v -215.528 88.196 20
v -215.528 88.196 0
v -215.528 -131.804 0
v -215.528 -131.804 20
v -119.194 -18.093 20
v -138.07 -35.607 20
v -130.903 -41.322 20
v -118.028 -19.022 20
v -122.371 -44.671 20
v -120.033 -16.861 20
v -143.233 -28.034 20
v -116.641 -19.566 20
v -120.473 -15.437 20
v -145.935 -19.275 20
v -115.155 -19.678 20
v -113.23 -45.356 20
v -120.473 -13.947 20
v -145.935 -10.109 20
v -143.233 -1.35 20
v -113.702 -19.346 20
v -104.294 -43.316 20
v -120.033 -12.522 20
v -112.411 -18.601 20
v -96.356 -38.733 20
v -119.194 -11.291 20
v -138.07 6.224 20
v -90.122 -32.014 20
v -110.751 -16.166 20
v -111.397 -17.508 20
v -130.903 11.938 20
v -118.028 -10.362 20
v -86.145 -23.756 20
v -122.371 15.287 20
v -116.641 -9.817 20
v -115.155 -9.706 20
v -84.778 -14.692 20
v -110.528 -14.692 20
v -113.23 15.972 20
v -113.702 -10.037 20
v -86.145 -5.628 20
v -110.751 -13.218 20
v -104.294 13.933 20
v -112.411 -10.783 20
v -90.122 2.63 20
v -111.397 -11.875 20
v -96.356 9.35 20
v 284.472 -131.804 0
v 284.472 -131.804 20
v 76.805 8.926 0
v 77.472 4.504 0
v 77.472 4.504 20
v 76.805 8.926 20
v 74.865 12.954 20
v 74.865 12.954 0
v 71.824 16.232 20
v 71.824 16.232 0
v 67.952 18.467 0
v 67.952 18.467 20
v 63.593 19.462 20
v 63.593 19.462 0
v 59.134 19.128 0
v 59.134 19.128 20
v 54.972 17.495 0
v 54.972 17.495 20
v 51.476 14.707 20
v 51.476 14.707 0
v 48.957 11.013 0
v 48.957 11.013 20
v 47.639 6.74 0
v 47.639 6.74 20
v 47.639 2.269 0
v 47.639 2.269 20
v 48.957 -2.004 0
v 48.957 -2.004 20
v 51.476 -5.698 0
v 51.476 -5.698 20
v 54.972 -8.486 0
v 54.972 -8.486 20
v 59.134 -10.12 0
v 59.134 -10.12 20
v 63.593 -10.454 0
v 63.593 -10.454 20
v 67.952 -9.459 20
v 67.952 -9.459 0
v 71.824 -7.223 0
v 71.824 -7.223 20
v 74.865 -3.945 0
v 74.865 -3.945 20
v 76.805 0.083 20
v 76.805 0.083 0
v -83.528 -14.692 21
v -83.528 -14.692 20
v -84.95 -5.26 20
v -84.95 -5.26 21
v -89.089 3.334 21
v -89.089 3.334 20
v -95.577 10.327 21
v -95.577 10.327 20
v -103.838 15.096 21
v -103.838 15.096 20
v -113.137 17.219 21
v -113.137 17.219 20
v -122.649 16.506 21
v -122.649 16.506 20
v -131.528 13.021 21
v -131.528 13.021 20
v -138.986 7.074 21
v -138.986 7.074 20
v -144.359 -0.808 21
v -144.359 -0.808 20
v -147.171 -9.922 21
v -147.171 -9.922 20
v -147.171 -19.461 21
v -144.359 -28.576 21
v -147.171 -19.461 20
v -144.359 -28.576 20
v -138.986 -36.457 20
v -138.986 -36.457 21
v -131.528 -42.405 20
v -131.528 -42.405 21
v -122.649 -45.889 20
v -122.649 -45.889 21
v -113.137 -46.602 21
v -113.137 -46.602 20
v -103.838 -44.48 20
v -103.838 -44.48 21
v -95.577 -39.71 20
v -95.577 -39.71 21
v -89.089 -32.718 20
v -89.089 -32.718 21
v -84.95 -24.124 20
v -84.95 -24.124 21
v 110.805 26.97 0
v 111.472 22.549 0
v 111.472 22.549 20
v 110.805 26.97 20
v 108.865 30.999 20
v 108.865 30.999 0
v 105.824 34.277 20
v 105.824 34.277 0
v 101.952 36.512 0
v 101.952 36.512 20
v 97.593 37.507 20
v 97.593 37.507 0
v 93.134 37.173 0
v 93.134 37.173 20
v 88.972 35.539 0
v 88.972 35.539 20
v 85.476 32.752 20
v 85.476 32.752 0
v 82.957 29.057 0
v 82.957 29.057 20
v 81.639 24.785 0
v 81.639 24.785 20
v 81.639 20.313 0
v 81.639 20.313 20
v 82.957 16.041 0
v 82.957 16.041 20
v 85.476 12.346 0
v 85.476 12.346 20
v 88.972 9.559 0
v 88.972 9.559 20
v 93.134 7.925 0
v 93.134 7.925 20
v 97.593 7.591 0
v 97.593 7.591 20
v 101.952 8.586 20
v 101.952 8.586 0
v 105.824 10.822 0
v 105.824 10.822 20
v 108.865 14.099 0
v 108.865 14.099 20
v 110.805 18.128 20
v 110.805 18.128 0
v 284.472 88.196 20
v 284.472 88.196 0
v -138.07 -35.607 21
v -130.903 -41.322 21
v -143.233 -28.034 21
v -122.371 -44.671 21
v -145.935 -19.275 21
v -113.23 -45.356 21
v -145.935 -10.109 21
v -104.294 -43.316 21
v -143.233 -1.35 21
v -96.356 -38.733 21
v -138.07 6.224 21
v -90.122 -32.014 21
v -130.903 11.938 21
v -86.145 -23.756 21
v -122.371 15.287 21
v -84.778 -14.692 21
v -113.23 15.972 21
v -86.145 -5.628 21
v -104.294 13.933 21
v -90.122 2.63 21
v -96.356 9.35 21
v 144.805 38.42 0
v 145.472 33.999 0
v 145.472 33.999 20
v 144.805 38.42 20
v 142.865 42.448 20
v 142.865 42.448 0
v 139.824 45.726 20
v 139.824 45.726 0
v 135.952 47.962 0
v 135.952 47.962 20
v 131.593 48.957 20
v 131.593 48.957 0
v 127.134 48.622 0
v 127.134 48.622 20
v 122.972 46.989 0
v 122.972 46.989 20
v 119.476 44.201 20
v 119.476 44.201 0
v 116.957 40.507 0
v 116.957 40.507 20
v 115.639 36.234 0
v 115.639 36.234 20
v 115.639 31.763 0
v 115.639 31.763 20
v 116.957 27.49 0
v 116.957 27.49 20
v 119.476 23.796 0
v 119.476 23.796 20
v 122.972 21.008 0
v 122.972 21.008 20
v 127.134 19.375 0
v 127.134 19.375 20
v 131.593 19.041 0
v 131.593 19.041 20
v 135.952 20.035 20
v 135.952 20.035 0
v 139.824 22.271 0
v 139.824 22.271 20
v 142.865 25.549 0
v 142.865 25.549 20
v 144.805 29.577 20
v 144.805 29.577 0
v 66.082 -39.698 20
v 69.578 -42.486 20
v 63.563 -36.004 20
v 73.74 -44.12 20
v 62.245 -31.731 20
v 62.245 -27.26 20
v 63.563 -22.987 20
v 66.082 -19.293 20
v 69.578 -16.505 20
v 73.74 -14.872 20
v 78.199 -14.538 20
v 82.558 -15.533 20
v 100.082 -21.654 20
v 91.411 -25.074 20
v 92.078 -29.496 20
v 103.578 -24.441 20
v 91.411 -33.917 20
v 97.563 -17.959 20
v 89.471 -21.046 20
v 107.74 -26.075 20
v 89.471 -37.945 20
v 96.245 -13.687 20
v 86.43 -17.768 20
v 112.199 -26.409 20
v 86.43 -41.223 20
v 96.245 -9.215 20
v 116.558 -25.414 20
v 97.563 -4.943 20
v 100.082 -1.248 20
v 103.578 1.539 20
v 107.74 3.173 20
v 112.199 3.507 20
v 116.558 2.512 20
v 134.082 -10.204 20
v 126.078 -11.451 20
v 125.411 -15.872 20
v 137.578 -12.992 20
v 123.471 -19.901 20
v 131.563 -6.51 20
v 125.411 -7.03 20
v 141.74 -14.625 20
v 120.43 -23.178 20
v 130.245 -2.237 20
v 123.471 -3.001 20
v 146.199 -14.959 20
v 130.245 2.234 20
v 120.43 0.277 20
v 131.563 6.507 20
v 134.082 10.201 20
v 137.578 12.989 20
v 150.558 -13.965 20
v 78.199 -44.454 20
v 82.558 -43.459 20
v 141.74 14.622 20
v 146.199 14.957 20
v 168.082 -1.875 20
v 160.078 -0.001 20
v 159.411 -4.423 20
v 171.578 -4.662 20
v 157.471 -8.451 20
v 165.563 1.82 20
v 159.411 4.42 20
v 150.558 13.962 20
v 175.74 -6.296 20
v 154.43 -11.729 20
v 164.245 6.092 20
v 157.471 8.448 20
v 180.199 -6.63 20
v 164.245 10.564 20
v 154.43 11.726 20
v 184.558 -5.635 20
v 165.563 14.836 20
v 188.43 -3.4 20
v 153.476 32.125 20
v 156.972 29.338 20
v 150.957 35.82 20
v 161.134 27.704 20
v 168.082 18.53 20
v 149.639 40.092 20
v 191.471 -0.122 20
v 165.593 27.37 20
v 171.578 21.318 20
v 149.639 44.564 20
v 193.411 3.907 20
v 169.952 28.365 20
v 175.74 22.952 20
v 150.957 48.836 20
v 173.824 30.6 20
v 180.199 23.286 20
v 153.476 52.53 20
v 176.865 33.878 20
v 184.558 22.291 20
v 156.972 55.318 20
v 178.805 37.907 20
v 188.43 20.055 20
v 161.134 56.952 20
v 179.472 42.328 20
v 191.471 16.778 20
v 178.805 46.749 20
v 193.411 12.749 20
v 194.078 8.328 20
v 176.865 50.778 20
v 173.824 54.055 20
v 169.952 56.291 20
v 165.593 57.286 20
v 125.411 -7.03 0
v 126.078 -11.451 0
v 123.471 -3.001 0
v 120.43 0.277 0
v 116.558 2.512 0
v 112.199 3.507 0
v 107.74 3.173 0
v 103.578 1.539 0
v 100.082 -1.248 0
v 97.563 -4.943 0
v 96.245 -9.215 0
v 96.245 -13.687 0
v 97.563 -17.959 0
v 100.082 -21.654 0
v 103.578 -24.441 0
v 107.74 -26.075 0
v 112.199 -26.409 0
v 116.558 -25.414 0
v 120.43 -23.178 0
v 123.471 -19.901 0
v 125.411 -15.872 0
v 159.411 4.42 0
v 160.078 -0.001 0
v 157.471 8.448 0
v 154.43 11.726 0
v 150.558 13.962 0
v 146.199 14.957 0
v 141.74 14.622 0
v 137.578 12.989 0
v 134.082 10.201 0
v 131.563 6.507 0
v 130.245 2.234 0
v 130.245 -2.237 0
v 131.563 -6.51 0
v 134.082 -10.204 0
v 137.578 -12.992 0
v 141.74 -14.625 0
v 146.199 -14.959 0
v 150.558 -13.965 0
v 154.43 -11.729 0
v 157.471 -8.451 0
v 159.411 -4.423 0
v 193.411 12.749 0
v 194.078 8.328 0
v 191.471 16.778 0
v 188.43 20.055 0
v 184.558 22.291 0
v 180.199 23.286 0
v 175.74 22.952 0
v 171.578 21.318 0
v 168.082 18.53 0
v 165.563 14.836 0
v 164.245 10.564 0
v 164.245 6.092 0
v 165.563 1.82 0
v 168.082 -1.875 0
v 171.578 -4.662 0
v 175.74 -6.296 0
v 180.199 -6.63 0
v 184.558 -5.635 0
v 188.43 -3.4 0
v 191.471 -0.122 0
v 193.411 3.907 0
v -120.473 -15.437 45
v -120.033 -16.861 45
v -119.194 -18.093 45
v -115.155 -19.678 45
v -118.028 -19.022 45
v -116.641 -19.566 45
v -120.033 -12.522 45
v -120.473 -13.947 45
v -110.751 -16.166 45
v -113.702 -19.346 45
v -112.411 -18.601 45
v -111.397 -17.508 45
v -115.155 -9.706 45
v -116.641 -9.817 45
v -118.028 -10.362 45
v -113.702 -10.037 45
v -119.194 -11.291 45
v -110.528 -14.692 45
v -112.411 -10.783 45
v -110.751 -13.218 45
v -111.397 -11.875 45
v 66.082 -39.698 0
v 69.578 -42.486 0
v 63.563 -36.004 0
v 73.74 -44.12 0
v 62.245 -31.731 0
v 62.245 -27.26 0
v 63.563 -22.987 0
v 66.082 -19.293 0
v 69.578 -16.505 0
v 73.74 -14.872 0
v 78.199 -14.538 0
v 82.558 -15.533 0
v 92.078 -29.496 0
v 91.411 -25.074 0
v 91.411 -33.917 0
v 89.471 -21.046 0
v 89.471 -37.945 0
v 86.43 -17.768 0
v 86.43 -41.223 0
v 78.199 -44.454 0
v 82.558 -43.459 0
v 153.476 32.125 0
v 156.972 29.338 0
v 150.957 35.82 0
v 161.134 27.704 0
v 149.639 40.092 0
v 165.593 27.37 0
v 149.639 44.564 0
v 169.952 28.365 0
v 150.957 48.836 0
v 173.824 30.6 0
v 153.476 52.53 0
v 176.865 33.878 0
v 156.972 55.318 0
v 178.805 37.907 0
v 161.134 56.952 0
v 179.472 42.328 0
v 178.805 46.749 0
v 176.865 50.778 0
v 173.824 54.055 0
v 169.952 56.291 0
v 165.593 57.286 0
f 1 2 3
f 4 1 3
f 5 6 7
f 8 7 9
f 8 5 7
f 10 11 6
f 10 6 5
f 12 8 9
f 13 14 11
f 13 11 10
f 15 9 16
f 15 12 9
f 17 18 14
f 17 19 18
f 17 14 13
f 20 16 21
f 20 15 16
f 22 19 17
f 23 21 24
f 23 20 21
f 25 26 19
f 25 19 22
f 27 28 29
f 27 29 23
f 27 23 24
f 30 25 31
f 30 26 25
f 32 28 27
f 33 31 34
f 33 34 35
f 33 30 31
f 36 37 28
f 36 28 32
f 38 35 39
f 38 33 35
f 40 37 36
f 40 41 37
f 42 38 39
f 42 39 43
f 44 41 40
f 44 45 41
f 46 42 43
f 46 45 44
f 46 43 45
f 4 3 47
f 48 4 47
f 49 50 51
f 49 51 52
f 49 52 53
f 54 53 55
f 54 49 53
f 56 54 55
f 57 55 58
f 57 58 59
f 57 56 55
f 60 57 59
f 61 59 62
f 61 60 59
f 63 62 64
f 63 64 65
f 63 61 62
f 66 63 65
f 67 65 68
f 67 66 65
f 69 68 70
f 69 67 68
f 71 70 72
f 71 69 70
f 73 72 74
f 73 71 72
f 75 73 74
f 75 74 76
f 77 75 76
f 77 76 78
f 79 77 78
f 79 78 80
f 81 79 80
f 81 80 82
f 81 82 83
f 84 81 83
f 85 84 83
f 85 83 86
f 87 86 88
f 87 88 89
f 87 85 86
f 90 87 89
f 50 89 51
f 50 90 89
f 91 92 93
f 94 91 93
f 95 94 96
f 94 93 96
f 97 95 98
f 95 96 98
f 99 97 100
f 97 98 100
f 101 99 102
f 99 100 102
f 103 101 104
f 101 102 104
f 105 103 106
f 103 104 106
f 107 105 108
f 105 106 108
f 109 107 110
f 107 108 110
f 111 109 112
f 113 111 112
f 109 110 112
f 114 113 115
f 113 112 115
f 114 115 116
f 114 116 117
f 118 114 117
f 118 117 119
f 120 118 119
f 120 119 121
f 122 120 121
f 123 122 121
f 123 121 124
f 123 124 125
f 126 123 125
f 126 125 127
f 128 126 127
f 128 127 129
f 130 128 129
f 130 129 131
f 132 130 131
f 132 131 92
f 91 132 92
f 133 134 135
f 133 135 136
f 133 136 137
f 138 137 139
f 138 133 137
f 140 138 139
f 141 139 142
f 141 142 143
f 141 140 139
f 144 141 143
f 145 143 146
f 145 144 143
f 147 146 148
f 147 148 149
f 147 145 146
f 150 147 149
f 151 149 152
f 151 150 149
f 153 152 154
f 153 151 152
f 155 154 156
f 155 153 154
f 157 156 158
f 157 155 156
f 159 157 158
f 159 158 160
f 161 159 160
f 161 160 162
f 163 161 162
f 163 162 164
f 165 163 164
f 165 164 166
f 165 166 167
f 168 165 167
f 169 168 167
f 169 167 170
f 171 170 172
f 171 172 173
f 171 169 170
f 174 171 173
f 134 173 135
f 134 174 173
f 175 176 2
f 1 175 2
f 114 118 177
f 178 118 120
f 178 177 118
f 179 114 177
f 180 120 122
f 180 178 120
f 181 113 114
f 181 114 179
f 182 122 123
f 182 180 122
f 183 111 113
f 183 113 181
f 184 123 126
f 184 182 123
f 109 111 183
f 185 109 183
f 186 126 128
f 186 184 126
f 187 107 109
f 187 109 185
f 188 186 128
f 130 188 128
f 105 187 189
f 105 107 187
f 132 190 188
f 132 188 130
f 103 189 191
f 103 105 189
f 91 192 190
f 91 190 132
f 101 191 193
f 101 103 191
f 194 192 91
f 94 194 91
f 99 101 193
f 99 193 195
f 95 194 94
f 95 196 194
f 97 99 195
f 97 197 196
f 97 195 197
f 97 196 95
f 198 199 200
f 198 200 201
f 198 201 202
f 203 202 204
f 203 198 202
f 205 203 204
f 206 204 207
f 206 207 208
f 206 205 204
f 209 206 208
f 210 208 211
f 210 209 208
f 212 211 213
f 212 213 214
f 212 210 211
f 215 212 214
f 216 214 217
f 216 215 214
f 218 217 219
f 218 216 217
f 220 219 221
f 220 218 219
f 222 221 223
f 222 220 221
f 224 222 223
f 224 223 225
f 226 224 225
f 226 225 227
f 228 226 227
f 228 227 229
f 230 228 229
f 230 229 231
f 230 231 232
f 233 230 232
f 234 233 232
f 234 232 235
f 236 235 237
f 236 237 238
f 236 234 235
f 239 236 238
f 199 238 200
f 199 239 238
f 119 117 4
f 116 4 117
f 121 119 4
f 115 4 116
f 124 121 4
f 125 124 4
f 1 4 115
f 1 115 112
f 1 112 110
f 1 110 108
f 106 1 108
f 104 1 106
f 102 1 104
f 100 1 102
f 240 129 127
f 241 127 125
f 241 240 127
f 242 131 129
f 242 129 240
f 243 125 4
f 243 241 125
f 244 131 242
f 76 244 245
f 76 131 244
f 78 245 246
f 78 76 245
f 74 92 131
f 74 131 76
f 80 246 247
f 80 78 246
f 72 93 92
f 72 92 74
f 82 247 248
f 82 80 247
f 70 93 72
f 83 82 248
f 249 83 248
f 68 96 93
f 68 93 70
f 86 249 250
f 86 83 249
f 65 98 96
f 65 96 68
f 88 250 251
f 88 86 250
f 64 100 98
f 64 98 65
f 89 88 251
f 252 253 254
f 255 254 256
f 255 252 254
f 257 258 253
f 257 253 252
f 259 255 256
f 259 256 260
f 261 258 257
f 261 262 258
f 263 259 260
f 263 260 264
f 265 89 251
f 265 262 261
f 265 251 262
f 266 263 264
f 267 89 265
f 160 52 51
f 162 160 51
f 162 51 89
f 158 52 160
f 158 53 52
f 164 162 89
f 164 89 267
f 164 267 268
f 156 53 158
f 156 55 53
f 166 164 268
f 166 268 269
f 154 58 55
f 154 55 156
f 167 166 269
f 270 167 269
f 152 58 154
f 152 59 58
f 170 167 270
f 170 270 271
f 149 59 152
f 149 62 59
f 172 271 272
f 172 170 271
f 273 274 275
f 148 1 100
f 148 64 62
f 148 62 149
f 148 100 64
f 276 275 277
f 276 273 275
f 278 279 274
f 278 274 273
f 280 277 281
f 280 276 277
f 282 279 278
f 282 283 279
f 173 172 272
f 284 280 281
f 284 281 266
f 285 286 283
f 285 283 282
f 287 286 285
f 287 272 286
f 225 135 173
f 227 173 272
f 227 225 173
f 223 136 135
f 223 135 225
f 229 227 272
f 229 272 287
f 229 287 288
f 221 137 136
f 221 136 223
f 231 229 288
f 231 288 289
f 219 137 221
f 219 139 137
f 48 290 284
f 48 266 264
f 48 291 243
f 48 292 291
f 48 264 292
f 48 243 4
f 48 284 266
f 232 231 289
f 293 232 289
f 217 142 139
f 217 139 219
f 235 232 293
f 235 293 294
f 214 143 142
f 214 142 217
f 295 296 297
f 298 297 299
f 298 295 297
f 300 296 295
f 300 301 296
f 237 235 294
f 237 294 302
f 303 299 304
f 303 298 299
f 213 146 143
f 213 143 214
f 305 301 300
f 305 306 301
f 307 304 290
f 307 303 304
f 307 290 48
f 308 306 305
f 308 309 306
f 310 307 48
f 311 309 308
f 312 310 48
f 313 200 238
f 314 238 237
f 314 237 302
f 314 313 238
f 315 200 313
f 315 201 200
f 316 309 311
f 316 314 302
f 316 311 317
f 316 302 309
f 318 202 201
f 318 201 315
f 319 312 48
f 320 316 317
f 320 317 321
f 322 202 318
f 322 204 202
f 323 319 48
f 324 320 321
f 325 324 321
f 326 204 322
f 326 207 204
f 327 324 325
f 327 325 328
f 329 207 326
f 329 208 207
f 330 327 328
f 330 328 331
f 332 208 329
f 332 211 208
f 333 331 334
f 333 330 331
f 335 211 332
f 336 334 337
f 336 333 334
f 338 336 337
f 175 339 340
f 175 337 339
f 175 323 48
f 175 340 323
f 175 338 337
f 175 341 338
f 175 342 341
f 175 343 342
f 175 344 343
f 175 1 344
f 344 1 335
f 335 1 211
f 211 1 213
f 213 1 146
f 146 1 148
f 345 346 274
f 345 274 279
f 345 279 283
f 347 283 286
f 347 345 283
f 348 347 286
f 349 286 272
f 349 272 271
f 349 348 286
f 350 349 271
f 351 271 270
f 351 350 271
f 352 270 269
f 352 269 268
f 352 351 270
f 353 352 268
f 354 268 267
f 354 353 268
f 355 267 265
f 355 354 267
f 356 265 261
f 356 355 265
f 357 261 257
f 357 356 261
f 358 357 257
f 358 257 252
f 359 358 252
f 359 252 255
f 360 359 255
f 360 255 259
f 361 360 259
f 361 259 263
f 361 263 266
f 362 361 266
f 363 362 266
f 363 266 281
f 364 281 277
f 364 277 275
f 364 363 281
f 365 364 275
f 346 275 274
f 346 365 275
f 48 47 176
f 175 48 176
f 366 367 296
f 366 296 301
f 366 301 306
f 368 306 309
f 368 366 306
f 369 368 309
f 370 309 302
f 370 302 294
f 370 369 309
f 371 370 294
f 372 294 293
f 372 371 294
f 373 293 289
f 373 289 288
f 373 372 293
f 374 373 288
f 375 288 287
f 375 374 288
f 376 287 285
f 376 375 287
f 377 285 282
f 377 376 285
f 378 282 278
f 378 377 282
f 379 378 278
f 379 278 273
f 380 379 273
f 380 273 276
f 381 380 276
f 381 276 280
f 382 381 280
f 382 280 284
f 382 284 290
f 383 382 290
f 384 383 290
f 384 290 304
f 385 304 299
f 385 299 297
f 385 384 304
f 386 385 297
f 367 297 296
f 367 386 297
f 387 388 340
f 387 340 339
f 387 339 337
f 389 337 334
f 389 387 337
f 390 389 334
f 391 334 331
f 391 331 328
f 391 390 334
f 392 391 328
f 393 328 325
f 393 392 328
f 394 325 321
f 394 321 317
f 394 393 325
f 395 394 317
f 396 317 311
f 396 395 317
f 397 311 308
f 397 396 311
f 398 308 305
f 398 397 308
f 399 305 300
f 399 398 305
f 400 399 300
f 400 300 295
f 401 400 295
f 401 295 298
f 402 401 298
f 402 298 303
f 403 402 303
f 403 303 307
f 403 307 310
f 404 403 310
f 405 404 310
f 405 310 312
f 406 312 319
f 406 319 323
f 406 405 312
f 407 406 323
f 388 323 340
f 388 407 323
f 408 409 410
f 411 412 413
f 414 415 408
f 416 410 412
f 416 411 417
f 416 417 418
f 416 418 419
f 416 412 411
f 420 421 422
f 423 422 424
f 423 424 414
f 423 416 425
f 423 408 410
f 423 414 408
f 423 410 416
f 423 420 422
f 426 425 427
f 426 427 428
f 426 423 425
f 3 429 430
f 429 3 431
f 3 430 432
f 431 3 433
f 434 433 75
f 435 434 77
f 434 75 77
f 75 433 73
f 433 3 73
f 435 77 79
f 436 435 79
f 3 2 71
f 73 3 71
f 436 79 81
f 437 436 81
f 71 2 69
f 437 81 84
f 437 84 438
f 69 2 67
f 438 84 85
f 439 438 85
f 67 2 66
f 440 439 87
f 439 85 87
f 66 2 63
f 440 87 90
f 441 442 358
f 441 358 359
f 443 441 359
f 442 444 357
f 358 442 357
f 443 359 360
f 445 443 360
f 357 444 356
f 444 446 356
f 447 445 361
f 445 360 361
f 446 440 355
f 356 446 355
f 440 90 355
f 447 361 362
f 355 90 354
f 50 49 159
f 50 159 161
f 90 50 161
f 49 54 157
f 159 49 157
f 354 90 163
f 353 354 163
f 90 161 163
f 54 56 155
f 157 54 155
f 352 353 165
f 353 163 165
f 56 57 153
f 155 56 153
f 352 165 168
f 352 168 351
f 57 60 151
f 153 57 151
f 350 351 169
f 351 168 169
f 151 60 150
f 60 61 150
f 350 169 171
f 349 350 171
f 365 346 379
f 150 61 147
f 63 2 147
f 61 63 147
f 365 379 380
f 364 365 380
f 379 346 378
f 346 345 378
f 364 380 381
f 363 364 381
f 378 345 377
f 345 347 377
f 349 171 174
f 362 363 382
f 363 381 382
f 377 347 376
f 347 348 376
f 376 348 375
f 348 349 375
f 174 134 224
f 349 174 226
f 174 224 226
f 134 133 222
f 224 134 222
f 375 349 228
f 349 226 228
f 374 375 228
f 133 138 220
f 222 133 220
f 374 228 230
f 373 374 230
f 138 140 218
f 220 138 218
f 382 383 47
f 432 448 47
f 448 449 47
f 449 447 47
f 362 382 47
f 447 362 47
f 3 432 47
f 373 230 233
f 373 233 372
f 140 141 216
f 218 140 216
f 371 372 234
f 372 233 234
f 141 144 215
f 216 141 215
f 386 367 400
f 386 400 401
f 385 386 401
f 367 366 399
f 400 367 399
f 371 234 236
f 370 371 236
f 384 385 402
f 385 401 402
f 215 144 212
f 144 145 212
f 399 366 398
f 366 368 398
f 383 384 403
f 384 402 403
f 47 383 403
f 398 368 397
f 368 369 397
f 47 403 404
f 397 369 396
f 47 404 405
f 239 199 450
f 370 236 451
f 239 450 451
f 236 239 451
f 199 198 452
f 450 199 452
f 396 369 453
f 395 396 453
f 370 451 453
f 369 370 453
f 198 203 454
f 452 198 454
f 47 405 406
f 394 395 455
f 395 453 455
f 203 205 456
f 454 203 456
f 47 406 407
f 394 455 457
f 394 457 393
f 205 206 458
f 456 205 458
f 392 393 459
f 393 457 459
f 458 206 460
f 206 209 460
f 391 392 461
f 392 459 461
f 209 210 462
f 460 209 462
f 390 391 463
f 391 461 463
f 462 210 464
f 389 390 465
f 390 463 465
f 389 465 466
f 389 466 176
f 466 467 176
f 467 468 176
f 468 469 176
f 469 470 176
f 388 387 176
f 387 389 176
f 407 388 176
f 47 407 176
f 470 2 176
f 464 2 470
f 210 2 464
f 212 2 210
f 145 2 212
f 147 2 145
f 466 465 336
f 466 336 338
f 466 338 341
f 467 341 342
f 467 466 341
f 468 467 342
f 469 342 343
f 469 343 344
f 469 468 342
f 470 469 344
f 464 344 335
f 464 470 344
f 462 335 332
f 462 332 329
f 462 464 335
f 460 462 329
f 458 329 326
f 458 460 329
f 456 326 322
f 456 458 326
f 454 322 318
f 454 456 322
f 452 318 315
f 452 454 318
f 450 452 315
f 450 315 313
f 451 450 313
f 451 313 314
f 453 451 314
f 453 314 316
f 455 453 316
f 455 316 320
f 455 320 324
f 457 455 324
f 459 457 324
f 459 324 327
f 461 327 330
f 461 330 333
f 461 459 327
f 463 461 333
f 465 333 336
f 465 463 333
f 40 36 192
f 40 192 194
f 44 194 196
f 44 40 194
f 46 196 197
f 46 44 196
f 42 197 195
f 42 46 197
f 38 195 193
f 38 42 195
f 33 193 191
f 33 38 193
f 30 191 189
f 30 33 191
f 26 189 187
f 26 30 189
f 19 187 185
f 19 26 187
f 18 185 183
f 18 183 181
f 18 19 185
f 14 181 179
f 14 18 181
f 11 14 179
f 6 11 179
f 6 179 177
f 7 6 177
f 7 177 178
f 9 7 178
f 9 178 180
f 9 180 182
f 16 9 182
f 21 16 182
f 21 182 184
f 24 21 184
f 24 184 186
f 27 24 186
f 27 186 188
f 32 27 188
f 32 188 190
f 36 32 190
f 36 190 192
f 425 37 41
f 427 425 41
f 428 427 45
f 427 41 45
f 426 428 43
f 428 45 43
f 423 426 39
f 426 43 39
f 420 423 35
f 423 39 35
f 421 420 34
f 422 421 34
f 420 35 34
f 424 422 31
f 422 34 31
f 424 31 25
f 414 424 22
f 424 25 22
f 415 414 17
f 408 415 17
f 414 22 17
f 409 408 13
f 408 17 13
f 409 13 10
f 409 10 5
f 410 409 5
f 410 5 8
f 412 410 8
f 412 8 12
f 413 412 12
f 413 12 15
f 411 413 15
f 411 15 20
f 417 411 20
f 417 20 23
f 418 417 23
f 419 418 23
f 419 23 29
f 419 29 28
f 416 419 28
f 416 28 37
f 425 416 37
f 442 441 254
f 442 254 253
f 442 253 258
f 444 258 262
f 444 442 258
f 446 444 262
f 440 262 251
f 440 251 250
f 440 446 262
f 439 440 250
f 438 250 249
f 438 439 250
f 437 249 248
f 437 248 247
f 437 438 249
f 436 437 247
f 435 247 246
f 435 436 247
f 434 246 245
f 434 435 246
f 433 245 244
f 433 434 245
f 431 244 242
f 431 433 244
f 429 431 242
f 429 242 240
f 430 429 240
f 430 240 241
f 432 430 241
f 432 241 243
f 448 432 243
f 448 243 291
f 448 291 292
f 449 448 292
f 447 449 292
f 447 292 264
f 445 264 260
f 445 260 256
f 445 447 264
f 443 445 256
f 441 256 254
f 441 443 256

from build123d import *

# Parameters (mm, degrees)
F0_R     = 15
F0_R_2   = 32
F0_R_3   = 30.75
F0_R_4   = 5
F1_DEPTH = 20
F2_DEPTH = 21
F3_DEPTH = 45


with BuildPart() as f1:
    # F0 (on Top) → F1 (new body)
    with BuildSketch(Plane.XY):
        Polygon((284.4715710252, 88.1958252929), (-215.5284289748, 88.1958252929), (-215.5284289748, -14.6917872616), (-215.5284289748, -112.5681422158), (-215.5284289748, -131.8041747071), (284.4715710252, -131.8041747071), (284.4715710252, -112.5681422158), align=None)
        with Locations((77.0776277755, -29.4956769794)):
            Circle(F0_R, mode=Mode.SUBTRACT)
        with Locations((-115.5284289748, -14.6917872616)):
            Circle(F0_R_2, mode=Mode.SUBTRACT)
        with Locations((62.4715710252, 4.5043230206)):
            Circle(F0_R, mode=Mode.SUBTRACT)
        with Locations((111.0776277755, -11.4509115215)):
            Circle(F0_R, mode=Mode.SUBTRACT)
        with Locations((145.0776277755, -0.0014326224)):
            Circle(F0_R, mode=Mode.SUBTRACT)
        with Locations((96.4715710252, 22.5490884785)):
            Circle(F0_R, mode=Mode.SUBTRACT)
        with Locations((179.0776277755, 8.3279051832)):
            Circle(F0_R, mode=Mode.SUBTRACT)
        with Locations((130.4715710252, 33.9985673776)):
            Circle(F0_R, mode=Mode.SUBTRACT)
        with Locations((164.4715710252, 42.3279051832)):
            Circle(F0_R, mode=Mode.SUBTRACT)
        with Locations((-115.5284289748, -14.6917872616)):
            Circle(F0_R_2)
        with Locations((-115.5284289748, -14.6917872616)):
            Circle(F0_R_3, mode=Mode.SUBTRACT)
        with Locations((-115.5284289748, -14.6917872616)):
            Circle(F0_R_3)
        with Locations((-115.5284289748, -14.6917872616)):
            Circle(F0_R_4, mode=Mode.SUBTRACT)
        with Locations((-115.5284289748, -14.6917872616)):
            Circle(F0_R_4)
    extrude(amount=F1_DEPTH)

    # F0 (on Top) → F2 (join)
    with BuildSketch(Plane.XY):
        with Locations((-115.5284289748, -14.6917872616)):
            Circle(F0_R_2)
        with Locations((-115.5284289748, -14.6917872616)):
            Circle(F0_R_3, mode=Mode.SUBTRACT)
    extrude(amount=F2_DEPTH)

    # F0 (on Top) → F3 (join)
    with BuildSketch(Plane.XY):
        with Locations((-115.5284289748, -14.6917872616)):
            Circle(F0_R_4)
    extrude(amount=F3_DEPTH)


solid = f1.part
